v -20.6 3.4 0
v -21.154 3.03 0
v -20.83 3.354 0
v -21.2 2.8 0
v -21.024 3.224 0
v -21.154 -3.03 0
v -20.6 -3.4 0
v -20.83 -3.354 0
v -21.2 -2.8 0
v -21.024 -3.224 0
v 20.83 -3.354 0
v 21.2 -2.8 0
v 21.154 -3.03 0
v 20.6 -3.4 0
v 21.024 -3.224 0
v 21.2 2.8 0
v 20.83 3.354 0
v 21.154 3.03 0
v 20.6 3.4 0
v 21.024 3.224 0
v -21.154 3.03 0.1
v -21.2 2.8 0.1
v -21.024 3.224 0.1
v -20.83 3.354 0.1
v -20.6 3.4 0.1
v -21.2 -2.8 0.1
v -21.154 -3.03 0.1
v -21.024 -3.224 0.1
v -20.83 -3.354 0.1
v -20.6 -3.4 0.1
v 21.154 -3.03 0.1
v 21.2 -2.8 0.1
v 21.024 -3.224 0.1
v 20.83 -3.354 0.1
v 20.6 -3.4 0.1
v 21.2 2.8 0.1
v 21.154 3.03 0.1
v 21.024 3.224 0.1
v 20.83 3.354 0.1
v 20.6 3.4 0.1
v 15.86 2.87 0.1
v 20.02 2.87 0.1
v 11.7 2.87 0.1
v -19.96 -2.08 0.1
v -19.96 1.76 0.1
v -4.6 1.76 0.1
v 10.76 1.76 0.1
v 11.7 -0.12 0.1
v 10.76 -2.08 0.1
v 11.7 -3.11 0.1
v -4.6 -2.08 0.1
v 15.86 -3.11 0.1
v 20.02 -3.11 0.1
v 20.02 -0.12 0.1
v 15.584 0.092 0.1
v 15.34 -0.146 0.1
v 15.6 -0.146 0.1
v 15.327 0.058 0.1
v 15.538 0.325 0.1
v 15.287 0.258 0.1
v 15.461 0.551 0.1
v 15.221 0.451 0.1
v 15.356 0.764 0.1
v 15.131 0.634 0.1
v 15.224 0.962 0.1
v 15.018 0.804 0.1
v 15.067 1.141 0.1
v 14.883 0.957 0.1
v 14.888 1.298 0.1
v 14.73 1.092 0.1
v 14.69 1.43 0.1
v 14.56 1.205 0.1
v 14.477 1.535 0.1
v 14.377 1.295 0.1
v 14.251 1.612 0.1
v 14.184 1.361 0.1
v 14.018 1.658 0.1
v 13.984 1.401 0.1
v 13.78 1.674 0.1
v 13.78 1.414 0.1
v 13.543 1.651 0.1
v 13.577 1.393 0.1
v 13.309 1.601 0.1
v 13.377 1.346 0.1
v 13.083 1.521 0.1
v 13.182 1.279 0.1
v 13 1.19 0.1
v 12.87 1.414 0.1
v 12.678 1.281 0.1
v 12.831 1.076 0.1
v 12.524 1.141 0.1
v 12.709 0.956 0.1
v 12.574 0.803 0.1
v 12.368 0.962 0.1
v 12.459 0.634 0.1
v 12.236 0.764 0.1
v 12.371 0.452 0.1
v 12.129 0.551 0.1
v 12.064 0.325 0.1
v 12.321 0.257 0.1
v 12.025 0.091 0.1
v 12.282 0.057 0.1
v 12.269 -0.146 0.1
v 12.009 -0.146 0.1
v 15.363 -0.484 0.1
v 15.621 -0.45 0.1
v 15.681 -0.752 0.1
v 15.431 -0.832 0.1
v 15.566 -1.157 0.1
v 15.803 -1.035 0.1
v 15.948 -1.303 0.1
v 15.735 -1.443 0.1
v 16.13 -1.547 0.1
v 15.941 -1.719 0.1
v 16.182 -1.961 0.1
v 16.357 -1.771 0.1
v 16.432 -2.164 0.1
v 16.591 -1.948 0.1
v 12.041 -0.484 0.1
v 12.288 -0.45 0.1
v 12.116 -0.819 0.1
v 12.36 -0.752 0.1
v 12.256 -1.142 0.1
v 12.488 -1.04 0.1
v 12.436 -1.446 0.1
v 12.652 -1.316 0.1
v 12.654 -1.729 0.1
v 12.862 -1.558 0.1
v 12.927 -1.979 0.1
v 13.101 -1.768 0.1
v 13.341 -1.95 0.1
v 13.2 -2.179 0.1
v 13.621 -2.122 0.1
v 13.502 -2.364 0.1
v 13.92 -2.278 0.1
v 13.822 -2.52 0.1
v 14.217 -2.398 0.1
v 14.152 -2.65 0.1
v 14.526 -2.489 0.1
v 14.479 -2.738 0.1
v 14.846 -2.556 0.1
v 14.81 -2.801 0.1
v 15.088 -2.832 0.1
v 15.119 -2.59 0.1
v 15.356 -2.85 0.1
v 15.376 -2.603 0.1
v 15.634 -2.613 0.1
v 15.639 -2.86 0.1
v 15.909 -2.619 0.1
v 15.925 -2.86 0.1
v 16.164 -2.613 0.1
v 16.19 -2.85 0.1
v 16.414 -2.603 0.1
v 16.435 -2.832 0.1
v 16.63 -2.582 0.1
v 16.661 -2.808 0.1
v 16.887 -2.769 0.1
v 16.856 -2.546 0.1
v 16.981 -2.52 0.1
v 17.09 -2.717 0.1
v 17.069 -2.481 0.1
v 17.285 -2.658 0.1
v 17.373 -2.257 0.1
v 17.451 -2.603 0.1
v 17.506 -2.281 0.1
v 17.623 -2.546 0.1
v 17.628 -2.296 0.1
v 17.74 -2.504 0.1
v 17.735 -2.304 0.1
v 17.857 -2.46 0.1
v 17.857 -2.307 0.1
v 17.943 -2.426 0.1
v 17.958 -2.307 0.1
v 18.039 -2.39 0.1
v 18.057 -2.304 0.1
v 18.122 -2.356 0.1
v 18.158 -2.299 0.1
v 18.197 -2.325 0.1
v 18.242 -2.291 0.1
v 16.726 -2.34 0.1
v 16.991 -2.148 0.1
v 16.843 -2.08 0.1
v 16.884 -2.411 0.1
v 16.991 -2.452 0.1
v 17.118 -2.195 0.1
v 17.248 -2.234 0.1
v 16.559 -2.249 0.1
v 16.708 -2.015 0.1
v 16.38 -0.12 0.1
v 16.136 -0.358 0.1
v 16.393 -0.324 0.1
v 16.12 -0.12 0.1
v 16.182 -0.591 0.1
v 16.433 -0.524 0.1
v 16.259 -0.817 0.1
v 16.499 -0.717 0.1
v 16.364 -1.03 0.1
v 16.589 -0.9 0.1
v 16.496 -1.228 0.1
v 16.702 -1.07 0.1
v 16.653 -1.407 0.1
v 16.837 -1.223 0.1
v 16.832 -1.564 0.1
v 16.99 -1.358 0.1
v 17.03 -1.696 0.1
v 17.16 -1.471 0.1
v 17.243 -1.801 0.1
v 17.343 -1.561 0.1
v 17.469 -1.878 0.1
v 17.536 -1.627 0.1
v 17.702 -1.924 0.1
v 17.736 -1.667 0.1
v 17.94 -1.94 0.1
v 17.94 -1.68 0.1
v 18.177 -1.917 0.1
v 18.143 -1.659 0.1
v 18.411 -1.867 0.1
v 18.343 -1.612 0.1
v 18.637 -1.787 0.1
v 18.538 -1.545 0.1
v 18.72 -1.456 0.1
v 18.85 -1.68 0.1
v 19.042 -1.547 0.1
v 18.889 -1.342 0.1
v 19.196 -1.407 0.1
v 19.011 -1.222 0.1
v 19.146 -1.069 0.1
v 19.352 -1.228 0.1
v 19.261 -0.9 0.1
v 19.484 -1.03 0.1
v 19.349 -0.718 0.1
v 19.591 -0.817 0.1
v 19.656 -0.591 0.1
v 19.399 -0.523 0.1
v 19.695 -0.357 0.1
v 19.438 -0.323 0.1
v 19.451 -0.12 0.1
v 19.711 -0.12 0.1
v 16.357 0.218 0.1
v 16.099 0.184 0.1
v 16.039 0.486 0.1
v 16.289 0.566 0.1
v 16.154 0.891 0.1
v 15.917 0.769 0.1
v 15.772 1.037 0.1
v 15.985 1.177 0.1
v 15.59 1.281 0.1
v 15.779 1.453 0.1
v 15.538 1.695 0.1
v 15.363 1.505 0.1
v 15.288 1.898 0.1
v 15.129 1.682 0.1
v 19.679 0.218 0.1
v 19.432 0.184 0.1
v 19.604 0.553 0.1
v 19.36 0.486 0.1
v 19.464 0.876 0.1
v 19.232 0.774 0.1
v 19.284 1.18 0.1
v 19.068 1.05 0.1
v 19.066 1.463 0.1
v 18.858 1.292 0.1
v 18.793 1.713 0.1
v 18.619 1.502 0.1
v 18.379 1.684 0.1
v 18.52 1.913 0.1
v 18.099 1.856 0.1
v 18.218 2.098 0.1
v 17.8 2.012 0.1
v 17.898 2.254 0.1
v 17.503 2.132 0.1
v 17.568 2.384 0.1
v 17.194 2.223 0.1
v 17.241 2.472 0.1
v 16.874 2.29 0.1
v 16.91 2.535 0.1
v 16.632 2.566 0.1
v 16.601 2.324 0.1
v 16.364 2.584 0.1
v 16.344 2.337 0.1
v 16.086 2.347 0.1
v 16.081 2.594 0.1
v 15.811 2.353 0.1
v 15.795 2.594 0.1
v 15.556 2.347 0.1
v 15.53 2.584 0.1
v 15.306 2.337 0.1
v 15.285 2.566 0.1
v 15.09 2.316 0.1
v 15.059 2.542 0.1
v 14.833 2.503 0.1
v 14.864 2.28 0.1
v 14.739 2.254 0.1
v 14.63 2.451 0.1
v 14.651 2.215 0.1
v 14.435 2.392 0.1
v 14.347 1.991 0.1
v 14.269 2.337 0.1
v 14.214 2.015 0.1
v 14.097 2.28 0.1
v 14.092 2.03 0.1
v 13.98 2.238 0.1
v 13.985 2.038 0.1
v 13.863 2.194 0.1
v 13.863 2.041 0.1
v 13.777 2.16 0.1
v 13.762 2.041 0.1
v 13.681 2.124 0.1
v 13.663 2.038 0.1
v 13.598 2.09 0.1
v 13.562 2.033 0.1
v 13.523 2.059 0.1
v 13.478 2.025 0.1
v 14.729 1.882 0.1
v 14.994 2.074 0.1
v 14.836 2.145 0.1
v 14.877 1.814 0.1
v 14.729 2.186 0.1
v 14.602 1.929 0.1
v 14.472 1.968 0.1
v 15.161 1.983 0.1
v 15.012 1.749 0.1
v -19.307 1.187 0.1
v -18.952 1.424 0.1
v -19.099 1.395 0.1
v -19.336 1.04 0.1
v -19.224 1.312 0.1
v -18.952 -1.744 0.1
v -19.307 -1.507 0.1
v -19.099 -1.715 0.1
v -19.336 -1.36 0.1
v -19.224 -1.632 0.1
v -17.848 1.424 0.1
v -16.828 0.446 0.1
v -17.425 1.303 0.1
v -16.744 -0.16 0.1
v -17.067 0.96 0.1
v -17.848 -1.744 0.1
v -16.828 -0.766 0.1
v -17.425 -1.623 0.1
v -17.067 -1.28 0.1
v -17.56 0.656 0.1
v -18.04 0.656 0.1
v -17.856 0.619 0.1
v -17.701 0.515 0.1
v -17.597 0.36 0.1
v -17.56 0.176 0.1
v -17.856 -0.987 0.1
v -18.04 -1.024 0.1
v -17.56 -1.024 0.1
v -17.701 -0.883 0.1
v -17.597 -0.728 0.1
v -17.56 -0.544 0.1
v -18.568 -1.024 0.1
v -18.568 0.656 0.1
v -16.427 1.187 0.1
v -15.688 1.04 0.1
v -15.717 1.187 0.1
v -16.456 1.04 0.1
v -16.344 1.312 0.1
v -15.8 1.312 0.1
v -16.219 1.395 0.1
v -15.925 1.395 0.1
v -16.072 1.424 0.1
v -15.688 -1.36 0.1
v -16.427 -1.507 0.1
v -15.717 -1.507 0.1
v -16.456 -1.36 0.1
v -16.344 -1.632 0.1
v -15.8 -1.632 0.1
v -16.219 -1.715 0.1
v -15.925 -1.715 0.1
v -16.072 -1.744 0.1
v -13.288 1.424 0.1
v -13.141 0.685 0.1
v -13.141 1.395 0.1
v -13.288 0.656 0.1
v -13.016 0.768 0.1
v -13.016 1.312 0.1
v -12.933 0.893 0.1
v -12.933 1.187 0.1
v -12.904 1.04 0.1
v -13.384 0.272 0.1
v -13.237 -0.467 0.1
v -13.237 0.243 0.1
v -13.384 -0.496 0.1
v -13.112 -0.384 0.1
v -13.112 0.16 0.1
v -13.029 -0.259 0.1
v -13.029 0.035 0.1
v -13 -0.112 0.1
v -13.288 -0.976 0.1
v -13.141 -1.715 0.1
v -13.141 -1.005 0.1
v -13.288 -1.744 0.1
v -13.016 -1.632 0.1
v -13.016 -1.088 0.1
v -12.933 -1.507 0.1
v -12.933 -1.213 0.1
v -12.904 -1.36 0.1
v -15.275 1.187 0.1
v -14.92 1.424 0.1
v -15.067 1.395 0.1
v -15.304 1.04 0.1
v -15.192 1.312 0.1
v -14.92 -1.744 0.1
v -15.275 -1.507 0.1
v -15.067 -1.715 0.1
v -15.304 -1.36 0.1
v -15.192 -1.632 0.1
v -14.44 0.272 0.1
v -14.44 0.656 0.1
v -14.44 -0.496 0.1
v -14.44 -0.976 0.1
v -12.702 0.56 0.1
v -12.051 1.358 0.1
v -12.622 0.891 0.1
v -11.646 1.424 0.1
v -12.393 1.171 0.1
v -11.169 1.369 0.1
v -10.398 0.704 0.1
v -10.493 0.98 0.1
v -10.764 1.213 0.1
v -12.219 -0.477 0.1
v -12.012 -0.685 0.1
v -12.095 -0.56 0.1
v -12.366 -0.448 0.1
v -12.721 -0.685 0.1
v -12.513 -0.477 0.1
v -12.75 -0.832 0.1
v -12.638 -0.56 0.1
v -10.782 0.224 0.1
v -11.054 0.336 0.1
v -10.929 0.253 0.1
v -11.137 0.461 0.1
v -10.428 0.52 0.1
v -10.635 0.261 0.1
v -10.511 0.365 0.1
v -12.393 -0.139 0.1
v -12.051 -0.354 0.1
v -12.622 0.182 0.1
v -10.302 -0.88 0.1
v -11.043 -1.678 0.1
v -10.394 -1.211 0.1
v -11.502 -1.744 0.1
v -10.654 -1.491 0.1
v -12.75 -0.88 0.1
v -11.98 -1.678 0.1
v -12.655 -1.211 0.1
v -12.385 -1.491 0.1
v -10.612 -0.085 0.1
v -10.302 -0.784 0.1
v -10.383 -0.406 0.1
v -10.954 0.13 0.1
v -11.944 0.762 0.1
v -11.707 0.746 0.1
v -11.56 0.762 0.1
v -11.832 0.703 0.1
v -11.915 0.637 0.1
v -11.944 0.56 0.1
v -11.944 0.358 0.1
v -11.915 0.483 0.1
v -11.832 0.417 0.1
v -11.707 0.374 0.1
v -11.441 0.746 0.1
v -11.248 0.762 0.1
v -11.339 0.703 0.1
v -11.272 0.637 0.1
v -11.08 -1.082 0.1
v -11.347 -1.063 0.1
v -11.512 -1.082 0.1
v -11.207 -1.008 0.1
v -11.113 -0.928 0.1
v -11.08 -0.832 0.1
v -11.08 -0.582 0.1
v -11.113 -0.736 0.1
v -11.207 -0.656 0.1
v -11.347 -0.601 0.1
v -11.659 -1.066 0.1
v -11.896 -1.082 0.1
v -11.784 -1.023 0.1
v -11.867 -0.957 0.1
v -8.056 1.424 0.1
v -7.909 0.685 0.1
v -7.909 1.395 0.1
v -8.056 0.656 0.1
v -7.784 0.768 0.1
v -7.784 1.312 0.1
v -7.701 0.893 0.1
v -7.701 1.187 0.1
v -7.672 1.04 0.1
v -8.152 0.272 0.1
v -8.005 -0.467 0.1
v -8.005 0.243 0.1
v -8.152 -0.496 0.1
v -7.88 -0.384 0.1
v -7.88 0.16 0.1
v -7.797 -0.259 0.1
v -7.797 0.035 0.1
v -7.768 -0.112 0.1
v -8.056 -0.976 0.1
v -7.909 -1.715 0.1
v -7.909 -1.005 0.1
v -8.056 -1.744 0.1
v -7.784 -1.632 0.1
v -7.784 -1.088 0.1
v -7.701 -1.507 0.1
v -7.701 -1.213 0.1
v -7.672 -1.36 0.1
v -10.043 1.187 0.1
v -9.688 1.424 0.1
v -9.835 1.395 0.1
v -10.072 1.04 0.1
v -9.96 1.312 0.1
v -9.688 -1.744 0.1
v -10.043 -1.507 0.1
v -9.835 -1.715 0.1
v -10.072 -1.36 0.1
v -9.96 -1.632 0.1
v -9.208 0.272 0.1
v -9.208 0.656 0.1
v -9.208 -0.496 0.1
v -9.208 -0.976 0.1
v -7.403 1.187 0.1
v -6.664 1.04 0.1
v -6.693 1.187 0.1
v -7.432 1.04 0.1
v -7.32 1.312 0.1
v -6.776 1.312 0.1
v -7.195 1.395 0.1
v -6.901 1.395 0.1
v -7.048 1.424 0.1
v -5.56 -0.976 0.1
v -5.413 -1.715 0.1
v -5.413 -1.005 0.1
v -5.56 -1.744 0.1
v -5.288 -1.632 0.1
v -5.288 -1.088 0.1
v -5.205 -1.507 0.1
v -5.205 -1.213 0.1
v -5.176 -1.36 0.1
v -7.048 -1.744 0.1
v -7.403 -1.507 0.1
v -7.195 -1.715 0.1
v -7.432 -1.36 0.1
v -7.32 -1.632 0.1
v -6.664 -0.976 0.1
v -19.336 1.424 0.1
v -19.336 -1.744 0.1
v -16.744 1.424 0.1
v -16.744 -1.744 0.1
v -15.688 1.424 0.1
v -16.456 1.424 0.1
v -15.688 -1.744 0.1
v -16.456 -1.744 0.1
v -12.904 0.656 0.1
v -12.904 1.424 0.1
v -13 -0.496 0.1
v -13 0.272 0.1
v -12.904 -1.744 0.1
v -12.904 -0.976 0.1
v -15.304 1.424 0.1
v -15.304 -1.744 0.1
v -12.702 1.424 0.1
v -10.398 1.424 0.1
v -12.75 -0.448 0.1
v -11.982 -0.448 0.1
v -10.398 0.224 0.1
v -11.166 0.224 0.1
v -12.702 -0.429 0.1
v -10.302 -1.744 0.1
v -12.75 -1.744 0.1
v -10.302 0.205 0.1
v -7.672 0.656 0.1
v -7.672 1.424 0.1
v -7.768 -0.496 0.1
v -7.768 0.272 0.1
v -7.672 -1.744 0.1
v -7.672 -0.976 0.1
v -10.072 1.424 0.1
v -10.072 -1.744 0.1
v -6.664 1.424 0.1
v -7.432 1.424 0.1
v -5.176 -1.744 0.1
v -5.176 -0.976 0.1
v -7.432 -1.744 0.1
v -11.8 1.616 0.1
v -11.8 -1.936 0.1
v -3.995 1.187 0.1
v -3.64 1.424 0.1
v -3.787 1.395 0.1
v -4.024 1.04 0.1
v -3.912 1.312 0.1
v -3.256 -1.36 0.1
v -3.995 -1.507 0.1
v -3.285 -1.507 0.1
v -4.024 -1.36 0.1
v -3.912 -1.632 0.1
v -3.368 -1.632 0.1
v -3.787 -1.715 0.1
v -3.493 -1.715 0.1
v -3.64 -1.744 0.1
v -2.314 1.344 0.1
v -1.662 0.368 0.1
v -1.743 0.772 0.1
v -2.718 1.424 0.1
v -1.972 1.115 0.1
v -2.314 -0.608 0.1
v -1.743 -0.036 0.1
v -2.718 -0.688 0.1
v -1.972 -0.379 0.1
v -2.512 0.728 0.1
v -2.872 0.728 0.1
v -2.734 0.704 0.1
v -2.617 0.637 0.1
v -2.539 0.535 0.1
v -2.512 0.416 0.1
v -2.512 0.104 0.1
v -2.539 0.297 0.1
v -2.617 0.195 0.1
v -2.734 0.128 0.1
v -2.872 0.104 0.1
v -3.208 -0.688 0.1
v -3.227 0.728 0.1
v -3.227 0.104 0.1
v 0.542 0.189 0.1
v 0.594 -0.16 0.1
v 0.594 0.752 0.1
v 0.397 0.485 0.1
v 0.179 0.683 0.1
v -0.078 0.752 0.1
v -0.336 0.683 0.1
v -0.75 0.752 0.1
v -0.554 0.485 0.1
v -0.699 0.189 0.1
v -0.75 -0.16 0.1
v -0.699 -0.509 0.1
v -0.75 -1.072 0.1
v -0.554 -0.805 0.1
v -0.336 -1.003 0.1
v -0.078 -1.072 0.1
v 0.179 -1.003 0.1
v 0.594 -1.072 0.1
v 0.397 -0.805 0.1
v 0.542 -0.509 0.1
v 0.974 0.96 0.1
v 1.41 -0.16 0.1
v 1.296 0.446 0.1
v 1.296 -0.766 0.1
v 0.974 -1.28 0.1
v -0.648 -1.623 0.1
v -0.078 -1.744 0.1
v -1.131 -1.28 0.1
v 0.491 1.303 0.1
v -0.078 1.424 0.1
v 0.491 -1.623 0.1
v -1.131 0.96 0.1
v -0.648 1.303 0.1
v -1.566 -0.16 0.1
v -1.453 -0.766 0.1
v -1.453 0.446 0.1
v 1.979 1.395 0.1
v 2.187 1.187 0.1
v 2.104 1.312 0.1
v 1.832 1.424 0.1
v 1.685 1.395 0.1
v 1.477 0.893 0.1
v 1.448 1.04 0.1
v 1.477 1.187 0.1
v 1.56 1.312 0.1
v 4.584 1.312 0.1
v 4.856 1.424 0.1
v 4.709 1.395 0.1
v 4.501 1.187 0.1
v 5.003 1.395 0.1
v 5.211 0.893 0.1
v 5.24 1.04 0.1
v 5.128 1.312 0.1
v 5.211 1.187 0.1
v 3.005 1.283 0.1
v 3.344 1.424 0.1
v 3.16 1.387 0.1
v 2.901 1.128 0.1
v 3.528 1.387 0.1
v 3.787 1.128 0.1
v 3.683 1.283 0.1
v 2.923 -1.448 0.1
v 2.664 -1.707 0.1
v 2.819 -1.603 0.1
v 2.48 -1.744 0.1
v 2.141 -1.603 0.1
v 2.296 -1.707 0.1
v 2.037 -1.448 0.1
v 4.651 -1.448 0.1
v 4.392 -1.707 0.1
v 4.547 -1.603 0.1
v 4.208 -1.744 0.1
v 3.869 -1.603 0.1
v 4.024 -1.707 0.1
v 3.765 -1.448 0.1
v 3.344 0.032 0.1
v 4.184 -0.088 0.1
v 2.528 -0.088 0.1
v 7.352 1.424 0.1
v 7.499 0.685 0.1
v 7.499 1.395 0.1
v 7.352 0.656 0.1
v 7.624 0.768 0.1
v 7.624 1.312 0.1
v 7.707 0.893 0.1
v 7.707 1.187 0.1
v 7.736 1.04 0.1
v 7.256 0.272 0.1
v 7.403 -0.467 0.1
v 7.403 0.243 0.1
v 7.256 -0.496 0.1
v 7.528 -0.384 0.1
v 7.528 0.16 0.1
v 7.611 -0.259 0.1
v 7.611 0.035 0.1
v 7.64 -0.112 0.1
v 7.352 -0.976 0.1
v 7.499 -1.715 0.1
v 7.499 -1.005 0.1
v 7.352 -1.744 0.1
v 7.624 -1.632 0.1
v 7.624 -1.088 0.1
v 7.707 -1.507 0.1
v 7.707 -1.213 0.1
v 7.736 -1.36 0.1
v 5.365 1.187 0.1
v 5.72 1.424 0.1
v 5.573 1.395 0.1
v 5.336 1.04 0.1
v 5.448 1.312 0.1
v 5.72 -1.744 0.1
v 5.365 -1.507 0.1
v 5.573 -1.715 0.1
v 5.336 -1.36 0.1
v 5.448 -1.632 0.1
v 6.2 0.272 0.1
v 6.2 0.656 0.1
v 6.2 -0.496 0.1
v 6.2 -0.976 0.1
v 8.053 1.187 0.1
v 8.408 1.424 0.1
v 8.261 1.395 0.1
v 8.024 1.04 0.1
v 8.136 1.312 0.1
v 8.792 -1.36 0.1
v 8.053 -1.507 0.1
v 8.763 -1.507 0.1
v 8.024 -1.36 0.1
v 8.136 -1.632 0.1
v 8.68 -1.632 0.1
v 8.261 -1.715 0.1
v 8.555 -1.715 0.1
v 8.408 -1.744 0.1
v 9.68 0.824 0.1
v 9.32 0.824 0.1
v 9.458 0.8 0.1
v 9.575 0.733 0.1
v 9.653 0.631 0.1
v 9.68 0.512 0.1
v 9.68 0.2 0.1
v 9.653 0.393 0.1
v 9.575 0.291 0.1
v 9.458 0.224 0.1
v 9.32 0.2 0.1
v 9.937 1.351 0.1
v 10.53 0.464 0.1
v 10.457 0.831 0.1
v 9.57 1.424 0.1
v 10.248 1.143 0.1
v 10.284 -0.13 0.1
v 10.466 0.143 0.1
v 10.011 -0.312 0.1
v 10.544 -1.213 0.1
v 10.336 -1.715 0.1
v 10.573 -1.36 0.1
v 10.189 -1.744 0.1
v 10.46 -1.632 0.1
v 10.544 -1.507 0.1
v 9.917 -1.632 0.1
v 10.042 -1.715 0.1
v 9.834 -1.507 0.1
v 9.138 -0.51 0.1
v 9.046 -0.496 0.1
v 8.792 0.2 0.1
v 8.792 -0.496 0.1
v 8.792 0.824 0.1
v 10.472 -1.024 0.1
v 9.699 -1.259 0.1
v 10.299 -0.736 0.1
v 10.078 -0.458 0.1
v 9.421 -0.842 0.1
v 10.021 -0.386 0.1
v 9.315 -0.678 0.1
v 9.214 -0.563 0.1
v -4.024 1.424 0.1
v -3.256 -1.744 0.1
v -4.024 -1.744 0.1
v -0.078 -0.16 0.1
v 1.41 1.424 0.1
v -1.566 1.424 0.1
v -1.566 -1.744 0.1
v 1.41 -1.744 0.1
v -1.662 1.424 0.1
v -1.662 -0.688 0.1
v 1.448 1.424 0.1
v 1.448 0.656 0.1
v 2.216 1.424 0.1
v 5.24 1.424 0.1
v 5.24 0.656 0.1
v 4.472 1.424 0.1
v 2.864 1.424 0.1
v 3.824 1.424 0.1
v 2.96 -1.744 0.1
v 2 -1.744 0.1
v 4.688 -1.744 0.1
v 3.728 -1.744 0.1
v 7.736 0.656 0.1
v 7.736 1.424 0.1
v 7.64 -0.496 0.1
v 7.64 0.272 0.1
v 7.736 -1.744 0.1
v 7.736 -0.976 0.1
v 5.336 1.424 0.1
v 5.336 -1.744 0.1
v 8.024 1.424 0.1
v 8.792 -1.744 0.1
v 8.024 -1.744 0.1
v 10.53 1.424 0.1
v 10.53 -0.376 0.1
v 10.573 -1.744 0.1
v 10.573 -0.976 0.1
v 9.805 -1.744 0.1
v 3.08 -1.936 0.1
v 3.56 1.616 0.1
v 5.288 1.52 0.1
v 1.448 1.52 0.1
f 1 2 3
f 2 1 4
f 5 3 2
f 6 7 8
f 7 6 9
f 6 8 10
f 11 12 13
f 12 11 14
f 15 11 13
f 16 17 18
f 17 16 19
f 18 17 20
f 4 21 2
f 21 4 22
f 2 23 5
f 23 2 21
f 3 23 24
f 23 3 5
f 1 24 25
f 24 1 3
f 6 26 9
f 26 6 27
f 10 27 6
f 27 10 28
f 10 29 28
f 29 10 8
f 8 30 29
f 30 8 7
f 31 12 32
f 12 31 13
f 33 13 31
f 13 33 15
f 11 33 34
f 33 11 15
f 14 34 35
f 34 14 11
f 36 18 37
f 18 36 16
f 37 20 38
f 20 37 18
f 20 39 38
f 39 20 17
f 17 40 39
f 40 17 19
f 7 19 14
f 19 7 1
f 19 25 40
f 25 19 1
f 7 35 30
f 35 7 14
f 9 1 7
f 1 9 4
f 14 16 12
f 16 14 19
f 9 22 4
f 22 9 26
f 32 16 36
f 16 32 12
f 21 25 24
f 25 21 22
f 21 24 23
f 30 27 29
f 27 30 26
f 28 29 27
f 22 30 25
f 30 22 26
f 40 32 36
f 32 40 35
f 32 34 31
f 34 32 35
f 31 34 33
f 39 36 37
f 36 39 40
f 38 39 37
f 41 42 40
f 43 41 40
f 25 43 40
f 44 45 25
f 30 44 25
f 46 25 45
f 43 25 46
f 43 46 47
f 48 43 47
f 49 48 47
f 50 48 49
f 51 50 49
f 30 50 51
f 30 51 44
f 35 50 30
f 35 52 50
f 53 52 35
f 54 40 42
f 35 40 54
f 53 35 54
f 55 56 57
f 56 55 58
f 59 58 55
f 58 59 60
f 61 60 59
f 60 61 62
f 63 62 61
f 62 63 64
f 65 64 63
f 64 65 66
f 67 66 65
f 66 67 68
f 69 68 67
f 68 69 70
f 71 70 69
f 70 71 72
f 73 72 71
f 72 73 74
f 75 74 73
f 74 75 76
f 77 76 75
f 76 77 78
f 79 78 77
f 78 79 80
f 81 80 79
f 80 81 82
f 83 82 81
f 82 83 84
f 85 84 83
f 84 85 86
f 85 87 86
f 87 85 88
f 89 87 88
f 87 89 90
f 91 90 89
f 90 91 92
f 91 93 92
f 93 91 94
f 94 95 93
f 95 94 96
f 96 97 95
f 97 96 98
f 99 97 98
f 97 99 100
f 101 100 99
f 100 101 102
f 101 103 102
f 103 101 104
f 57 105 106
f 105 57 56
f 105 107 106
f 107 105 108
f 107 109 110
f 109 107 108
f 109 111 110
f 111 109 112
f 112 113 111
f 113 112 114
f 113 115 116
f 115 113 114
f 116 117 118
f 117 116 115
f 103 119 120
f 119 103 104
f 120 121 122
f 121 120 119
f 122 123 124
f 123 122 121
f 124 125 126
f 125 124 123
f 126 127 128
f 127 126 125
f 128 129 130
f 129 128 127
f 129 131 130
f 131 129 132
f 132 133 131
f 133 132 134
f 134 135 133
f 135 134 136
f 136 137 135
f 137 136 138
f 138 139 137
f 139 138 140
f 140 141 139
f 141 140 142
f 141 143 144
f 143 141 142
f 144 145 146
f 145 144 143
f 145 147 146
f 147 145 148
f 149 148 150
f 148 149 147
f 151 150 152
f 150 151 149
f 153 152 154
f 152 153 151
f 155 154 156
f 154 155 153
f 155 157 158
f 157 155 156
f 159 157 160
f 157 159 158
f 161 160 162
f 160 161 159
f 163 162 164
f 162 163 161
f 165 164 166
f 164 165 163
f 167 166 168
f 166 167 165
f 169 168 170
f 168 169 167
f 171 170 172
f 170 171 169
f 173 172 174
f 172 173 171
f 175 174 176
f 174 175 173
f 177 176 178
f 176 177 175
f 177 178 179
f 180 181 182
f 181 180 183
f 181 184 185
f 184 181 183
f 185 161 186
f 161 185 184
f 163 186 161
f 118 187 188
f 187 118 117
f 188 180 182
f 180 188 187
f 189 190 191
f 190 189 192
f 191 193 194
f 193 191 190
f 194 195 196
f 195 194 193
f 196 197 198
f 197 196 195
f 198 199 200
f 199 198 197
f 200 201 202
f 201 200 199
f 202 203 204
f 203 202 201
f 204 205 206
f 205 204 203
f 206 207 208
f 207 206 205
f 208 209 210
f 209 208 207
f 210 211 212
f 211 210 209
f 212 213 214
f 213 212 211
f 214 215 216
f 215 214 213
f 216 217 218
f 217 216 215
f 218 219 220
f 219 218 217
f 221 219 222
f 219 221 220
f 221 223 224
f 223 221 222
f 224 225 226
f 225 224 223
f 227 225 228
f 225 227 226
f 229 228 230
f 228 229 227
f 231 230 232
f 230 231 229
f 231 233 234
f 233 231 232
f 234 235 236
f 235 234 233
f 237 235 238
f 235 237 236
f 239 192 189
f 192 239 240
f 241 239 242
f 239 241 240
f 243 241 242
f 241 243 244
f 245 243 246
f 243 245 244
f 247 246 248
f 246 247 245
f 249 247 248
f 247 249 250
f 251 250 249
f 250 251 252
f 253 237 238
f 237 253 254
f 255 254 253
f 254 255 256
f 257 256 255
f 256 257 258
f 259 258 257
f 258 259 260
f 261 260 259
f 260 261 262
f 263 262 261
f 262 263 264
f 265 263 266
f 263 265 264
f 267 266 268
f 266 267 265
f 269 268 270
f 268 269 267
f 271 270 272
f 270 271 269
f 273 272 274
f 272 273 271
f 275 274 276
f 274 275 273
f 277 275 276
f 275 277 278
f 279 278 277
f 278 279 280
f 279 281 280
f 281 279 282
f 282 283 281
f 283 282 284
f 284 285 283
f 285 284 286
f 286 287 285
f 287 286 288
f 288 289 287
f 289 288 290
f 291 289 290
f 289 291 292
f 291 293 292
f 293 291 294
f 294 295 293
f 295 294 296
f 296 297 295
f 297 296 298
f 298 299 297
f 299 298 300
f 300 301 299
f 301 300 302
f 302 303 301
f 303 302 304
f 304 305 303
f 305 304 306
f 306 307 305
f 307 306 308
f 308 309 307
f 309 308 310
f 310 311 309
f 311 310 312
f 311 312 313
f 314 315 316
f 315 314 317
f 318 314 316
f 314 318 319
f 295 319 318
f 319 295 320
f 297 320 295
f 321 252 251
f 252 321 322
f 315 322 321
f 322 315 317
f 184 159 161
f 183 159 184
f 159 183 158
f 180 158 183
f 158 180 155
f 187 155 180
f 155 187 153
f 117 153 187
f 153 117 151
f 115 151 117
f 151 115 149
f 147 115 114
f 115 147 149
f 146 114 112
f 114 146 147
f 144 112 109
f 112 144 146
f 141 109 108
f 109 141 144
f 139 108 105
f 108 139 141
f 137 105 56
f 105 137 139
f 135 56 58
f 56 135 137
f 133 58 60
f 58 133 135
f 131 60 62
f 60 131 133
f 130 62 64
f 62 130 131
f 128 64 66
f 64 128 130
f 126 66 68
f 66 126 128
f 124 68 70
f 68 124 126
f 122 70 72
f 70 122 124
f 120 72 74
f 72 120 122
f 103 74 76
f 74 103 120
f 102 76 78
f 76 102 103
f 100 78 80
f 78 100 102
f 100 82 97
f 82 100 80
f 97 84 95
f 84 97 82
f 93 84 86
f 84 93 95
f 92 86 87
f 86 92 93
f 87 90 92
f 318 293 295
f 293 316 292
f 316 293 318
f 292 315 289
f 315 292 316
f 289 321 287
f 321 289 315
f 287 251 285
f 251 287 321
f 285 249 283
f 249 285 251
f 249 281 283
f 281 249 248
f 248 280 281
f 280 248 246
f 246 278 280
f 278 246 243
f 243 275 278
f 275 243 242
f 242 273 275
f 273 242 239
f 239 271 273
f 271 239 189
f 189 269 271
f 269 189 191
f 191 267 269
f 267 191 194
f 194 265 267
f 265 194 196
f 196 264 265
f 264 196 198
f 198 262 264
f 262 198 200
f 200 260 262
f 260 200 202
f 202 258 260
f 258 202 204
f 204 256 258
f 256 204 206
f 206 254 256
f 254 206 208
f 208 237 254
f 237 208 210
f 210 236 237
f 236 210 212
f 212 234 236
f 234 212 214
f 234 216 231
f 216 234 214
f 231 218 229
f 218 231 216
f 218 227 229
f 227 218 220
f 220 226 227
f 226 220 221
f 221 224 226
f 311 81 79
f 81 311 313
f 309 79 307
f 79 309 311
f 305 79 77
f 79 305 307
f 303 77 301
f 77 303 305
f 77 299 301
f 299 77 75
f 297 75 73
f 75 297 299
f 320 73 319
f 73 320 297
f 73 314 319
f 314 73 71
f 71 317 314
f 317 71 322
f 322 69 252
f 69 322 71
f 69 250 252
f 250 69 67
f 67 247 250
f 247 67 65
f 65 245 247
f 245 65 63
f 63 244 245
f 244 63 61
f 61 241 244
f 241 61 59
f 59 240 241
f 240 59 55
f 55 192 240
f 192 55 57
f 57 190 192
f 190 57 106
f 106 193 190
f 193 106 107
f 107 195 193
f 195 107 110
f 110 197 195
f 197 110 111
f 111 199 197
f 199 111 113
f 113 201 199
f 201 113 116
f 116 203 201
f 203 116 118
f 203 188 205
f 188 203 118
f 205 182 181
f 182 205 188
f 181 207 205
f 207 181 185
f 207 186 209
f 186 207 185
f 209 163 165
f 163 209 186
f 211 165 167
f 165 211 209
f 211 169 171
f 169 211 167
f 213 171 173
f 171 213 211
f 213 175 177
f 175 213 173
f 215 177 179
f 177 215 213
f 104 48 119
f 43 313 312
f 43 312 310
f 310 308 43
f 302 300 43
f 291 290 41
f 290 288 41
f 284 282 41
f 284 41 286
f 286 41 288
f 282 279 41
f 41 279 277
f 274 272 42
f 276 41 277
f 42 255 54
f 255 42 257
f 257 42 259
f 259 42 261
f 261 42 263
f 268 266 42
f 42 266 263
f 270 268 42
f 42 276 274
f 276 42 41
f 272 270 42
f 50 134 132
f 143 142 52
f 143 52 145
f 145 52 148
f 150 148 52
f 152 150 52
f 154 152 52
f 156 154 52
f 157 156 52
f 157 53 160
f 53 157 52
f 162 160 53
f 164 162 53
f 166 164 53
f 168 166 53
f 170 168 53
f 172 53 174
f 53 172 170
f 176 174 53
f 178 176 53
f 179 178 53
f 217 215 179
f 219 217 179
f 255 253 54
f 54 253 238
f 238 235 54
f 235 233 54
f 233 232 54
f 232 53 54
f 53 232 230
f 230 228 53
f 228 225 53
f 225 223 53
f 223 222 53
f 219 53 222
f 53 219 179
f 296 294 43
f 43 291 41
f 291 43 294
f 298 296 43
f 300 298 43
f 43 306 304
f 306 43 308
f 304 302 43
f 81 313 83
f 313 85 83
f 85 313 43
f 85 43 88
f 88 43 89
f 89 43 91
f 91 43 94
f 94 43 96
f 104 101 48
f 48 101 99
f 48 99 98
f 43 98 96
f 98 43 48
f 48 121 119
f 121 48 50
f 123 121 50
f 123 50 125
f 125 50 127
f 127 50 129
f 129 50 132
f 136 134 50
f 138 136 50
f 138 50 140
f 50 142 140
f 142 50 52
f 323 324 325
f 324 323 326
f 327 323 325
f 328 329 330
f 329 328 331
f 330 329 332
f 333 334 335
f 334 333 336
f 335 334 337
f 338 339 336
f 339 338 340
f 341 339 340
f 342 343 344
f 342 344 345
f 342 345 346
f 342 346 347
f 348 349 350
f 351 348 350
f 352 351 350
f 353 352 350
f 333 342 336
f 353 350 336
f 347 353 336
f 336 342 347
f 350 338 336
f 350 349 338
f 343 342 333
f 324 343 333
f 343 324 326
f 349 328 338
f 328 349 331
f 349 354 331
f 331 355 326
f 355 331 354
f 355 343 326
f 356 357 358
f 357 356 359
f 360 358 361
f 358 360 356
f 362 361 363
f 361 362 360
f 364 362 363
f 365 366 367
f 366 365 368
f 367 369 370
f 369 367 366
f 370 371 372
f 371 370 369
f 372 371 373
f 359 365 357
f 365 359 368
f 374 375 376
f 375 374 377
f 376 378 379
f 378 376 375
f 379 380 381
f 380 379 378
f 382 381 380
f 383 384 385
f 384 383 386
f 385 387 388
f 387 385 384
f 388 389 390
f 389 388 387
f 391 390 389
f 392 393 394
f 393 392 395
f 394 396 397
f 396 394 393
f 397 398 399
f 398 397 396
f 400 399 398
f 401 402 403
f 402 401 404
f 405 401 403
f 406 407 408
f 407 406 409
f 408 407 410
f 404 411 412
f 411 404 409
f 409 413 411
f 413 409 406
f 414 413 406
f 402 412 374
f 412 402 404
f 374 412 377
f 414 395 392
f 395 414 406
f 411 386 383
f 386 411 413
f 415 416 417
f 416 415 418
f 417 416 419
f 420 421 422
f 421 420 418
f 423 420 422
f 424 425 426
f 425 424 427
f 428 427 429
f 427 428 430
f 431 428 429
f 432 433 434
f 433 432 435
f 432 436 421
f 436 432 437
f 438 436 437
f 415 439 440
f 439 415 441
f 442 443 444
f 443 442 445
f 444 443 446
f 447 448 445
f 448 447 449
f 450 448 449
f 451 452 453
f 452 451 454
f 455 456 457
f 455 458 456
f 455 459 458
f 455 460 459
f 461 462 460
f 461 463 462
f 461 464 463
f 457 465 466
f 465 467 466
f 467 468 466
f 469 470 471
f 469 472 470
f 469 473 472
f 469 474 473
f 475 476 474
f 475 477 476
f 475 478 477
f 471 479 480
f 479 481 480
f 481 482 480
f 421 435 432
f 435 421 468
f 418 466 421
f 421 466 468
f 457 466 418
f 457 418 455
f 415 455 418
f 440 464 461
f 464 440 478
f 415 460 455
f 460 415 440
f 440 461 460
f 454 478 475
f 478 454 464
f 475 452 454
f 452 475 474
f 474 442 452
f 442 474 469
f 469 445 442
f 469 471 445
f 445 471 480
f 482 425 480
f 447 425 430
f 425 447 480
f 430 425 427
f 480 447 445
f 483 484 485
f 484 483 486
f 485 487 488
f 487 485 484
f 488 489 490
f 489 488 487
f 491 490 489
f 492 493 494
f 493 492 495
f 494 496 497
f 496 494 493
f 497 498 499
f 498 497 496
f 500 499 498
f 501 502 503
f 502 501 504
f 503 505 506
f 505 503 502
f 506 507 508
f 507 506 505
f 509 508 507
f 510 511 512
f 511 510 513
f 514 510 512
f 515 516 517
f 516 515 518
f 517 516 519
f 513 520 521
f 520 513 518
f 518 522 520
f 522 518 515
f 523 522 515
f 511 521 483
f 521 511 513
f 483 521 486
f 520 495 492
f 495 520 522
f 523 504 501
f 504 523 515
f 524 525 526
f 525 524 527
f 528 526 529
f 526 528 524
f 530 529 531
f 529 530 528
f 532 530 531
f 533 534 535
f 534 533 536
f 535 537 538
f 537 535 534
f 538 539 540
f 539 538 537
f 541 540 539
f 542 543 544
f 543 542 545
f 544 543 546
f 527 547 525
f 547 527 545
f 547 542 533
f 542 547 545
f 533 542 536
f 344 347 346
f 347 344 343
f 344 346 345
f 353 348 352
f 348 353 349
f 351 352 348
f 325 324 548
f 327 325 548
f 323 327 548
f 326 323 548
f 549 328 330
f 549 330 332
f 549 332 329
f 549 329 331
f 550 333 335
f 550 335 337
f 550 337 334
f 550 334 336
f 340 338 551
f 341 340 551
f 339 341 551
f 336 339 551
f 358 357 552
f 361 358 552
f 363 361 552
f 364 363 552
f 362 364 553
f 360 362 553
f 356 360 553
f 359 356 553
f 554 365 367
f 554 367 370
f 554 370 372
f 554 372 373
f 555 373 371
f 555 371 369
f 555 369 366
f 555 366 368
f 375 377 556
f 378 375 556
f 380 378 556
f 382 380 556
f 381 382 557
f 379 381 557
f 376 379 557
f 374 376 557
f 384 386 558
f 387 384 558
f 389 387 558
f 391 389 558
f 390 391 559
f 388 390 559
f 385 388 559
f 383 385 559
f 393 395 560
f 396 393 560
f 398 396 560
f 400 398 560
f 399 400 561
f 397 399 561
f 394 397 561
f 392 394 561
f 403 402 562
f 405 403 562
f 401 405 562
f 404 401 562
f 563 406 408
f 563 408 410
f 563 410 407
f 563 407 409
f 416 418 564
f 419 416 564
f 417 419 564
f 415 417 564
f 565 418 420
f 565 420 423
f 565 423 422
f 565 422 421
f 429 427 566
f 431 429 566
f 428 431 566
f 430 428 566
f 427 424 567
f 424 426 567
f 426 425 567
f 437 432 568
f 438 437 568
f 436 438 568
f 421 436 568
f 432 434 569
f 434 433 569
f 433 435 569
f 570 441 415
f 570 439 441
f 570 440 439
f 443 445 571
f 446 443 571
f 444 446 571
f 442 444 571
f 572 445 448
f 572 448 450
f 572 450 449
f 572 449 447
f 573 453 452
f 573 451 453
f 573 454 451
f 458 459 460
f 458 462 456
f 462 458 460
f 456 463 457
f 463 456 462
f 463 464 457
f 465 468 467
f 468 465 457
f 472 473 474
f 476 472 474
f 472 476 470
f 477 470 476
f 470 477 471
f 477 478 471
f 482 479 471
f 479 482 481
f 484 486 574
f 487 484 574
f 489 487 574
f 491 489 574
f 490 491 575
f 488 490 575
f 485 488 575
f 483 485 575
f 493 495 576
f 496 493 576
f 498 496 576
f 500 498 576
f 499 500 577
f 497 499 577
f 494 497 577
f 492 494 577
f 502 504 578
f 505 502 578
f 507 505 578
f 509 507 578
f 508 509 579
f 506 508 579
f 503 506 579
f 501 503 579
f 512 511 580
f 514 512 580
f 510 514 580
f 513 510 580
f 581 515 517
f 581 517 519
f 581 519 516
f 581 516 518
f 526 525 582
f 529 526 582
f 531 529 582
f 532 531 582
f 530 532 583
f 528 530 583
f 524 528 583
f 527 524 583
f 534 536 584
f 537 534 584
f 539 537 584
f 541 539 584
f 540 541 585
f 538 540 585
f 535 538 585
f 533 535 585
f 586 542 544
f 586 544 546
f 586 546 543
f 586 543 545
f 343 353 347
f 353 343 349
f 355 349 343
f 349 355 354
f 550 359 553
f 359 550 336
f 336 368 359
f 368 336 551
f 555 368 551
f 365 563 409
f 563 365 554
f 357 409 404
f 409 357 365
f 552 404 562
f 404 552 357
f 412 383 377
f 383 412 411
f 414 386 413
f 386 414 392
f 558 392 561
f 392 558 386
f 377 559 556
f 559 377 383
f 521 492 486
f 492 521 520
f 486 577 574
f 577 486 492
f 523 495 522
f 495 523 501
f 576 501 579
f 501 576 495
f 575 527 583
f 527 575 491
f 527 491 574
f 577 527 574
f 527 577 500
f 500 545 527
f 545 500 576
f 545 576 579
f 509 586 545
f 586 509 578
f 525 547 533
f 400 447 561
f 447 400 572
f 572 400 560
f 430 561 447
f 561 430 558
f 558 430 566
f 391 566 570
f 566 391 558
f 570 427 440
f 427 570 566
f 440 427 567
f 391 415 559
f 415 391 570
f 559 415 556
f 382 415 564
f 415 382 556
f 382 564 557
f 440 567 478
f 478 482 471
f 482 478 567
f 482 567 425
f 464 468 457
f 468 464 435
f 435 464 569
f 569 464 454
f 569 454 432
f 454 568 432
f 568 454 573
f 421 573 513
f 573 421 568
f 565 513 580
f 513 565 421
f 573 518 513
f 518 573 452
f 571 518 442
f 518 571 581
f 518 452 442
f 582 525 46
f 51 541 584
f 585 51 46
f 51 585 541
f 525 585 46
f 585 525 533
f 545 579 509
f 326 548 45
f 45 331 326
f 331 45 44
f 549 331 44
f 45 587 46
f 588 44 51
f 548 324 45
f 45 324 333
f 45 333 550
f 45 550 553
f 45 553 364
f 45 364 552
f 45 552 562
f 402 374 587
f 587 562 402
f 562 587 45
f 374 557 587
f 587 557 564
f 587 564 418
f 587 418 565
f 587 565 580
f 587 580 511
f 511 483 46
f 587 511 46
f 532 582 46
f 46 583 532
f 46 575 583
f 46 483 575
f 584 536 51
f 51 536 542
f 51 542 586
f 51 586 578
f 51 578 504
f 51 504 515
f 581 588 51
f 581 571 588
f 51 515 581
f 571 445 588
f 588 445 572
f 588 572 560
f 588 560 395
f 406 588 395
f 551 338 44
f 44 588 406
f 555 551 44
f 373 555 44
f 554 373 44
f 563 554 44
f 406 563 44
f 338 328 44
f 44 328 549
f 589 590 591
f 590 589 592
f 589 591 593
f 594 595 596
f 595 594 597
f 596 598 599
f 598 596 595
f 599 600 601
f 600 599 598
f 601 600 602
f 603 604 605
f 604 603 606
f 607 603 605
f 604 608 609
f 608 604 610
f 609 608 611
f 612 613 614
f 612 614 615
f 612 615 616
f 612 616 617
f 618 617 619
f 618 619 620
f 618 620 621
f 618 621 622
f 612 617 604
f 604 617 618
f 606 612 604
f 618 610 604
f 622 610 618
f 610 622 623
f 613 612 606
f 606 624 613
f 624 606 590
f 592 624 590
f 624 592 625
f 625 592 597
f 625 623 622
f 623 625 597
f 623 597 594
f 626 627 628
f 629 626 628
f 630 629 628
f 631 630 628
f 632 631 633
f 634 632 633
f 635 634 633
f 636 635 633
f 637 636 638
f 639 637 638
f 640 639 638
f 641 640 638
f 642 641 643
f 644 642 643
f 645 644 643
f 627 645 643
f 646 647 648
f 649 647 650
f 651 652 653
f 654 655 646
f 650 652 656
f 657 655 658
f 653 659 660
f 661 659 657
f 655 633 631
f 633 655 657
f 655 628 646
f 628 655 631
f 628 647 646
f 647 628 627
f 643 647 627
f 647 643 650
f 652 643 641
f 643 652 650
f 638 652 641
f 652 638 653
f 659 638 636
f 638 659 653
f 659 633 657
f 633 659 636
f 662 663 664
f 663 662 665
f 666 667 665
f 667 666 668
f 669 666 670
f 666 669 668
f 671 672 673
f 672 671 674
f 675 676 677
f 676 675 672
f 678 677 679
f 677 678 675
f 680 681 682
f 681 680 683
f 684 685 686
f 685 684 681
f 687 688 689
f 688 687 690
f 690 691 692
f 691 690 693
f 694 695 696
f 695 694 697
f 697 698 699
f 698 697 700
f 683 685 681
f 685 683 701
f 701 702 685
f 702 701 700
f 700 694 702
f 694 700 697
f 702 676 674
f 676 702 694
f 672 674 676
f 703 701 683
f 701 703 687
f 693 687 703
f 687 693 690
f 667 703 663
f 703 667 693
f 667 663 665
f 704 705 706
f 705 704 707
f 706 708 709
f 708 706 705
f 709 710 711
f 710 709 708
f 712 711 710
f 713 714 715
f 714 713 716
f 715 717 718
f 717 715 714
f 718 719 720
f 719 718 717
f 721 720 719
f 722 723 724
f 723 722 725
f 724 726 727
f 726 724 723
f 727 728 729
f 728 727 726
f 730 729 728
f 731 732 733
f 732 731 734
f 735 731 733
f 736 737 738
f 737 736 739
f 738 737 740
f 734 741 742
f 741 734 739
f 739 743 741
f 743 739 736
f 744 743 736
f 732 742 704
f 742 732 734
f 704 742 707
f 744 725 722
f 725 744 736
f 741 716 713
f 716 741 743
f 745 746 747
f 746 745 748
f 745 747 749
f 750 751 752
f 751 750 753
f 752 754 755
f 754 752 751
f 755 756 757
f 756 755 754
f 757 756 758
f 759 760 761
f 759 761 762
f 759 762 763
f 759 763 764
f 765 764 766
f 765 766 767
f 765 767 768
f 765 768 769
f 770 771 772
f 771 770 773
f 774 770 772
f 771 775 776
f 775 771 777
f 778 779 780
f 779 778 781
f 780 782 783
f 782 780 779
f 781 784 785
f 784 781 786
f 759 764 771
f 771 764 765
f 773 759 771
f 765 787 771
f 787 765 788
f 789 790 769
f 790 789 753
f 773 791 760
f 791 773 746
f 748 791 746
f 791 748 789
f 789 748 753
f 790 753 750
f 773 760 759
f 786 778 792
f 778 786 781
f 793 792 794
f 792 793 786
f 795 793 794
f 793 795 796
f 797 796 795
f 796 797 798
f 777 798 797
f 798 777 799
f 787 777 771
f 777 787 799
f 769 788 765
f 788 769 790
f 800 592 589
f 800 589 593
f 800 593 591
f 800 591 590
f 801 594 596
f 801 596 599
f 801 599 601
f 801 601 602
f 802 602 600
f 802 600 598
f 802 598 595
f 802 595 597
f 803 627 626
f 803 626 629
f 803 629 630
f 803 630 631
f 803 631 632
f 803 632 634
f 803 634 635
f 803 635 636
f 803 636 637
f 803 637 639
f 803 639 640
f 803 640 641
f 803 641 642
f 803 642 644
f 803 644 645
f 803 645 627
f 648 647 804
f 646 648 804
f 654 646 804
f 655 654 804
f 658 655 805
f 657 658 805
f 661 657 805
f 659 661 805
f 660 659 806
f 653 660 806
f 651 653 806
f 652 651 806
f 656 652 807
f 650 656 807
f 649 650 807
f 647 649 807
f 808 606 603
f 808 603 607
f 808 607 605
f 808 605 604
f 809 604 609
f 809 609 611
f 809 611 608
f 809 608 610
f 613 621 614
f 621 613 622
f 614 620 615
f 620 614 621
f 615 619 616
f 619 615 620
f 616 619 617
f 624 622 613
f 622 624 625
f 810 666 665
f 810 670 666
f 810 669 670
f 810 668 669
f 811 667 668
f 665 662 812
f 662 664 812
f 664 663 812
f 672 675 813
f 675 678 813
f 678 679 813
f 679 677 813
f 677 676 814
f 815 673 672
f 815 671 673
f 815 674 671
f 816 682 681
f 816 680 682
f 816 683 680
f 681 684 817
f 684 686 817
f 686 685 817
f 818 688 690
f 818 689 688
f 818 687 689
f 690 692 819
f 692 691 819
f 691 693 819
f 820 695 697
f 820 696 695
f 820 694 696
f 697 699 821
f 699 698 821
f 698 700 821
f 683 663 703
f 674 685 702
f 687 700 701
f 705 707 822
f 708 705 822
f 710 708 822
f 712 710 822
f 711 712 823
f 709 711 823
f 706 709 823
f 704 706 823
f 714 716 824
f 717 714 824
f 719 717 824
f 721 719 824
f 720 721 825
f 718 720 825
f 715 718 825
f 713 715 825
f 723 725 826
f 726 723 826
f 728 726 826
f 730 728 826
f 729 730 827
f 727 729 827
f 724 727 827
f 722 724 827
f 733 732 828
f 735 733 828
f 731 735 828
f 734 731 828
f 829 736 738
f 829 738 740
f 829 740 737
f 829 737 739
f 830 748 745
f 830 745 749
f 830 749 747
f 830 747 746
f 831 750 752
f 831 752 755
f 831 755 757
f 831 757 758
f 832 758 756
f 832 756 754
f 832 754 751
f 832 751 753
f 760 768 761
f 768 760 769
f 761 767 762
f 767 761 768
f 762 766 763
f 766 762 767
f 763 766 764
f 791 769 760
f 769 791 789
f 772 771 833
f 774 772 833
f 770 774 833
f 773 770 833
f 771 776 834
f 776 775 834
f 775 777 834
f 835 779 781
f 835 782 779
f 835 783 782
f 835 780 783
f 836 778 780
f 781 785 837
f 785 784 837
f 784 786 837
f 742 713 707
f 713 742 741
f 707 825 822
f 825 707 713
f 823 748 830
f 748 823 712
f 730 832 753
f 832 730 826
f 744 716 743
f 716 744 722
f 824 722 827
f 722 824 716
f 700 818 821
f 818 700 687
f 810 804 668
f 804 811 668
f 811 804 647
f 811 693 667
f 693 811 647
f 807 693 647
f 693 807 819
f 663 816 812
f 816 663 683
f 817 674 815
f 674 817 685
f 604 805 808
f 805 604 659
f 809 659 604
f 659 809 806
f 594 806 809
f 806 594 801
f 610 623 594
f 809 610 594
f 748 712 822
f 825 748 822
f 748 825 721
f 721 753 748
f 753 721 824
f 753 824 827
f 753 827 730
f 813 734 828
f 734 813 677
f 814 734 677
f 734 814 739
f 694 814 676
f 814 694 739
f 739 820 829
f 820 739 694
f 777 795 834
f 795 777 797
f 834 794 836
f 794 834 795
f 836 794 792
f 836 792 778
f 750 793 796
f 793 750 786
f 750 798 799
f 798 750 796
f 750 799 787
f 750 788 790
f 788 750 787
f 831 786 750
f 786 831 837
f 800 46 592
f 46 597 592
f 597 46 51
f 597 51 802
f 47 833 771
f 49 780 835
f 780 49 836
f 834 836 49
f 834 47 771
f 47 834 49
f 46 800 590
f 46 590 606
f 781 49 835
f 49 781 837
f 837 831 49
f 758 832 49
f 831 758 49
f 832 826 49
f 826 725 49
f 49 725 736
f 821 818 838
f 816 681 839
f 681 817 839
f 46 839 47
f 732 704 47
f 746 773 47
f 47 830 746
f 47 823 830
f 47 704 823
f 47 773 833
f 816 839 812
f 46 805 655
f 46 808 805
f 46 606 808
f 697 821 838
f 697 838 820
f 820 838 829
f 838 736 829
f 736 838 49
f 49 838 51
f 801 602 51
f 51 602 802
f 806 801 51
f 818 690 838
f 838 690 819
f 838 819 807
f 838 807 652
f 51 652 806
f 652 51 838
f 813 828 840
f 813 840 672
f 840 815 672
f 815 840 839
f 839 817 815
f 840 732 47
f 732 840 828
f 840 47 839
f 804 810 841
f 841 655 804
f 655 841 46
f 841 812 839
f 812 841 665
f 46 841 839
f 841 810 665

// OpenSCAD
use <../lib.scad>
use <../p/logo-octan.scad>
use <s/4121723ds01.scad>
use <s/4121723s05.scad>
use <s/4121723s06.scad>
use <s/4121723s07.scad>
use <s/4121723s08.scad>
function ldraw_lib__4121723c() = [
// 0 Sticker  0.95 x  5.3 with Octan Logo and Red "DIESEL POWER" - Left Aligned
// 0 Name: 4121723c.dat
// 0 Author: Ulrich Röder [UR]
// 0 !LDRAW_ORG Part UPDATE 2022-01
// 0 !LICENSE Licensed under CC BY 2.0 and CC BY 4.0 : see CAreadme.txt
// 
// 0 BFC CERTIFY CCW
  [0,"BFC","CERTIFY"],
  [0,"BFC","CCW"],
// 
// 0 !KEYWORDS Model Team, Racing Truck, Set 5563
// 
// 0 !HISTORY 2022-01-14 [PTadmin] Official Update 2022-01
// 
// 
// 1 16 0 0 0 -1 0 0 0 1 0 0 0 1 s\4121723ds01.dat
  [1,16,0,0,0,-1,0,0,0,1,0,0,0,1, ldraw_lib__s__4121723ds01()],
// 1 16 39.65 -.25 -.3 .65 0 0 0 1 0 0 0 .65 logo-octan.dat
  [1,16,39.65,-.25,-.3,.65,0,0,0,1,0,0,0,.65, ldraw_lib__logo_octan()],
// 1 4 -30.7 -.25 -.4 1.2 0 0 0 1 0 0 0 1.2 s\4121723s05.dat
  [1,4,-30.7,-.25,-.4,1.2,0,0,0,1,0,0,0,1.2, ldraw_lib__s__4121723s05()],
// 1 16 -30.7 -.25 -.4 1.2 0 0 0 1 0 0 0 1.2 s\4121723s07.dat
  [1,16,-30.7,-.25,-.4,1.2,0,0,0,1,0,0,0,1.2, ldraw_lib__s__4121723s07()],
// 1 4 7.7 -.25 -.4 1.2 0 0 0 1 0 0 0 1.2 s\4121723s06.dat
  [1,4,7.7,-.25,-.4,1.2,0,0,0,1,0,0,0,1.2, ldraw_lib__s__4121723s06()],
// 1 16 7.7 -.25 -.4 1.2 0 0 0 1 0 0 0 1.2 s\4121723s08.dat
  [1,16,7.7,-.25,-.4,1.2,0,0,0,1,0,0,0,1.2, ldraw_lib__s__4121723s08()],
];
module ldraw_lib__4121723c(step=0, col=false, unit=2/5, alt=false, line=0.2, solid=!$preview)
    makepoly(ldraw_lib__4121723c(), step=step, col=col, unit=unit, alt=alt, line=line, solid=solid);
ldraw_lib__4121723c(line=0.2);
